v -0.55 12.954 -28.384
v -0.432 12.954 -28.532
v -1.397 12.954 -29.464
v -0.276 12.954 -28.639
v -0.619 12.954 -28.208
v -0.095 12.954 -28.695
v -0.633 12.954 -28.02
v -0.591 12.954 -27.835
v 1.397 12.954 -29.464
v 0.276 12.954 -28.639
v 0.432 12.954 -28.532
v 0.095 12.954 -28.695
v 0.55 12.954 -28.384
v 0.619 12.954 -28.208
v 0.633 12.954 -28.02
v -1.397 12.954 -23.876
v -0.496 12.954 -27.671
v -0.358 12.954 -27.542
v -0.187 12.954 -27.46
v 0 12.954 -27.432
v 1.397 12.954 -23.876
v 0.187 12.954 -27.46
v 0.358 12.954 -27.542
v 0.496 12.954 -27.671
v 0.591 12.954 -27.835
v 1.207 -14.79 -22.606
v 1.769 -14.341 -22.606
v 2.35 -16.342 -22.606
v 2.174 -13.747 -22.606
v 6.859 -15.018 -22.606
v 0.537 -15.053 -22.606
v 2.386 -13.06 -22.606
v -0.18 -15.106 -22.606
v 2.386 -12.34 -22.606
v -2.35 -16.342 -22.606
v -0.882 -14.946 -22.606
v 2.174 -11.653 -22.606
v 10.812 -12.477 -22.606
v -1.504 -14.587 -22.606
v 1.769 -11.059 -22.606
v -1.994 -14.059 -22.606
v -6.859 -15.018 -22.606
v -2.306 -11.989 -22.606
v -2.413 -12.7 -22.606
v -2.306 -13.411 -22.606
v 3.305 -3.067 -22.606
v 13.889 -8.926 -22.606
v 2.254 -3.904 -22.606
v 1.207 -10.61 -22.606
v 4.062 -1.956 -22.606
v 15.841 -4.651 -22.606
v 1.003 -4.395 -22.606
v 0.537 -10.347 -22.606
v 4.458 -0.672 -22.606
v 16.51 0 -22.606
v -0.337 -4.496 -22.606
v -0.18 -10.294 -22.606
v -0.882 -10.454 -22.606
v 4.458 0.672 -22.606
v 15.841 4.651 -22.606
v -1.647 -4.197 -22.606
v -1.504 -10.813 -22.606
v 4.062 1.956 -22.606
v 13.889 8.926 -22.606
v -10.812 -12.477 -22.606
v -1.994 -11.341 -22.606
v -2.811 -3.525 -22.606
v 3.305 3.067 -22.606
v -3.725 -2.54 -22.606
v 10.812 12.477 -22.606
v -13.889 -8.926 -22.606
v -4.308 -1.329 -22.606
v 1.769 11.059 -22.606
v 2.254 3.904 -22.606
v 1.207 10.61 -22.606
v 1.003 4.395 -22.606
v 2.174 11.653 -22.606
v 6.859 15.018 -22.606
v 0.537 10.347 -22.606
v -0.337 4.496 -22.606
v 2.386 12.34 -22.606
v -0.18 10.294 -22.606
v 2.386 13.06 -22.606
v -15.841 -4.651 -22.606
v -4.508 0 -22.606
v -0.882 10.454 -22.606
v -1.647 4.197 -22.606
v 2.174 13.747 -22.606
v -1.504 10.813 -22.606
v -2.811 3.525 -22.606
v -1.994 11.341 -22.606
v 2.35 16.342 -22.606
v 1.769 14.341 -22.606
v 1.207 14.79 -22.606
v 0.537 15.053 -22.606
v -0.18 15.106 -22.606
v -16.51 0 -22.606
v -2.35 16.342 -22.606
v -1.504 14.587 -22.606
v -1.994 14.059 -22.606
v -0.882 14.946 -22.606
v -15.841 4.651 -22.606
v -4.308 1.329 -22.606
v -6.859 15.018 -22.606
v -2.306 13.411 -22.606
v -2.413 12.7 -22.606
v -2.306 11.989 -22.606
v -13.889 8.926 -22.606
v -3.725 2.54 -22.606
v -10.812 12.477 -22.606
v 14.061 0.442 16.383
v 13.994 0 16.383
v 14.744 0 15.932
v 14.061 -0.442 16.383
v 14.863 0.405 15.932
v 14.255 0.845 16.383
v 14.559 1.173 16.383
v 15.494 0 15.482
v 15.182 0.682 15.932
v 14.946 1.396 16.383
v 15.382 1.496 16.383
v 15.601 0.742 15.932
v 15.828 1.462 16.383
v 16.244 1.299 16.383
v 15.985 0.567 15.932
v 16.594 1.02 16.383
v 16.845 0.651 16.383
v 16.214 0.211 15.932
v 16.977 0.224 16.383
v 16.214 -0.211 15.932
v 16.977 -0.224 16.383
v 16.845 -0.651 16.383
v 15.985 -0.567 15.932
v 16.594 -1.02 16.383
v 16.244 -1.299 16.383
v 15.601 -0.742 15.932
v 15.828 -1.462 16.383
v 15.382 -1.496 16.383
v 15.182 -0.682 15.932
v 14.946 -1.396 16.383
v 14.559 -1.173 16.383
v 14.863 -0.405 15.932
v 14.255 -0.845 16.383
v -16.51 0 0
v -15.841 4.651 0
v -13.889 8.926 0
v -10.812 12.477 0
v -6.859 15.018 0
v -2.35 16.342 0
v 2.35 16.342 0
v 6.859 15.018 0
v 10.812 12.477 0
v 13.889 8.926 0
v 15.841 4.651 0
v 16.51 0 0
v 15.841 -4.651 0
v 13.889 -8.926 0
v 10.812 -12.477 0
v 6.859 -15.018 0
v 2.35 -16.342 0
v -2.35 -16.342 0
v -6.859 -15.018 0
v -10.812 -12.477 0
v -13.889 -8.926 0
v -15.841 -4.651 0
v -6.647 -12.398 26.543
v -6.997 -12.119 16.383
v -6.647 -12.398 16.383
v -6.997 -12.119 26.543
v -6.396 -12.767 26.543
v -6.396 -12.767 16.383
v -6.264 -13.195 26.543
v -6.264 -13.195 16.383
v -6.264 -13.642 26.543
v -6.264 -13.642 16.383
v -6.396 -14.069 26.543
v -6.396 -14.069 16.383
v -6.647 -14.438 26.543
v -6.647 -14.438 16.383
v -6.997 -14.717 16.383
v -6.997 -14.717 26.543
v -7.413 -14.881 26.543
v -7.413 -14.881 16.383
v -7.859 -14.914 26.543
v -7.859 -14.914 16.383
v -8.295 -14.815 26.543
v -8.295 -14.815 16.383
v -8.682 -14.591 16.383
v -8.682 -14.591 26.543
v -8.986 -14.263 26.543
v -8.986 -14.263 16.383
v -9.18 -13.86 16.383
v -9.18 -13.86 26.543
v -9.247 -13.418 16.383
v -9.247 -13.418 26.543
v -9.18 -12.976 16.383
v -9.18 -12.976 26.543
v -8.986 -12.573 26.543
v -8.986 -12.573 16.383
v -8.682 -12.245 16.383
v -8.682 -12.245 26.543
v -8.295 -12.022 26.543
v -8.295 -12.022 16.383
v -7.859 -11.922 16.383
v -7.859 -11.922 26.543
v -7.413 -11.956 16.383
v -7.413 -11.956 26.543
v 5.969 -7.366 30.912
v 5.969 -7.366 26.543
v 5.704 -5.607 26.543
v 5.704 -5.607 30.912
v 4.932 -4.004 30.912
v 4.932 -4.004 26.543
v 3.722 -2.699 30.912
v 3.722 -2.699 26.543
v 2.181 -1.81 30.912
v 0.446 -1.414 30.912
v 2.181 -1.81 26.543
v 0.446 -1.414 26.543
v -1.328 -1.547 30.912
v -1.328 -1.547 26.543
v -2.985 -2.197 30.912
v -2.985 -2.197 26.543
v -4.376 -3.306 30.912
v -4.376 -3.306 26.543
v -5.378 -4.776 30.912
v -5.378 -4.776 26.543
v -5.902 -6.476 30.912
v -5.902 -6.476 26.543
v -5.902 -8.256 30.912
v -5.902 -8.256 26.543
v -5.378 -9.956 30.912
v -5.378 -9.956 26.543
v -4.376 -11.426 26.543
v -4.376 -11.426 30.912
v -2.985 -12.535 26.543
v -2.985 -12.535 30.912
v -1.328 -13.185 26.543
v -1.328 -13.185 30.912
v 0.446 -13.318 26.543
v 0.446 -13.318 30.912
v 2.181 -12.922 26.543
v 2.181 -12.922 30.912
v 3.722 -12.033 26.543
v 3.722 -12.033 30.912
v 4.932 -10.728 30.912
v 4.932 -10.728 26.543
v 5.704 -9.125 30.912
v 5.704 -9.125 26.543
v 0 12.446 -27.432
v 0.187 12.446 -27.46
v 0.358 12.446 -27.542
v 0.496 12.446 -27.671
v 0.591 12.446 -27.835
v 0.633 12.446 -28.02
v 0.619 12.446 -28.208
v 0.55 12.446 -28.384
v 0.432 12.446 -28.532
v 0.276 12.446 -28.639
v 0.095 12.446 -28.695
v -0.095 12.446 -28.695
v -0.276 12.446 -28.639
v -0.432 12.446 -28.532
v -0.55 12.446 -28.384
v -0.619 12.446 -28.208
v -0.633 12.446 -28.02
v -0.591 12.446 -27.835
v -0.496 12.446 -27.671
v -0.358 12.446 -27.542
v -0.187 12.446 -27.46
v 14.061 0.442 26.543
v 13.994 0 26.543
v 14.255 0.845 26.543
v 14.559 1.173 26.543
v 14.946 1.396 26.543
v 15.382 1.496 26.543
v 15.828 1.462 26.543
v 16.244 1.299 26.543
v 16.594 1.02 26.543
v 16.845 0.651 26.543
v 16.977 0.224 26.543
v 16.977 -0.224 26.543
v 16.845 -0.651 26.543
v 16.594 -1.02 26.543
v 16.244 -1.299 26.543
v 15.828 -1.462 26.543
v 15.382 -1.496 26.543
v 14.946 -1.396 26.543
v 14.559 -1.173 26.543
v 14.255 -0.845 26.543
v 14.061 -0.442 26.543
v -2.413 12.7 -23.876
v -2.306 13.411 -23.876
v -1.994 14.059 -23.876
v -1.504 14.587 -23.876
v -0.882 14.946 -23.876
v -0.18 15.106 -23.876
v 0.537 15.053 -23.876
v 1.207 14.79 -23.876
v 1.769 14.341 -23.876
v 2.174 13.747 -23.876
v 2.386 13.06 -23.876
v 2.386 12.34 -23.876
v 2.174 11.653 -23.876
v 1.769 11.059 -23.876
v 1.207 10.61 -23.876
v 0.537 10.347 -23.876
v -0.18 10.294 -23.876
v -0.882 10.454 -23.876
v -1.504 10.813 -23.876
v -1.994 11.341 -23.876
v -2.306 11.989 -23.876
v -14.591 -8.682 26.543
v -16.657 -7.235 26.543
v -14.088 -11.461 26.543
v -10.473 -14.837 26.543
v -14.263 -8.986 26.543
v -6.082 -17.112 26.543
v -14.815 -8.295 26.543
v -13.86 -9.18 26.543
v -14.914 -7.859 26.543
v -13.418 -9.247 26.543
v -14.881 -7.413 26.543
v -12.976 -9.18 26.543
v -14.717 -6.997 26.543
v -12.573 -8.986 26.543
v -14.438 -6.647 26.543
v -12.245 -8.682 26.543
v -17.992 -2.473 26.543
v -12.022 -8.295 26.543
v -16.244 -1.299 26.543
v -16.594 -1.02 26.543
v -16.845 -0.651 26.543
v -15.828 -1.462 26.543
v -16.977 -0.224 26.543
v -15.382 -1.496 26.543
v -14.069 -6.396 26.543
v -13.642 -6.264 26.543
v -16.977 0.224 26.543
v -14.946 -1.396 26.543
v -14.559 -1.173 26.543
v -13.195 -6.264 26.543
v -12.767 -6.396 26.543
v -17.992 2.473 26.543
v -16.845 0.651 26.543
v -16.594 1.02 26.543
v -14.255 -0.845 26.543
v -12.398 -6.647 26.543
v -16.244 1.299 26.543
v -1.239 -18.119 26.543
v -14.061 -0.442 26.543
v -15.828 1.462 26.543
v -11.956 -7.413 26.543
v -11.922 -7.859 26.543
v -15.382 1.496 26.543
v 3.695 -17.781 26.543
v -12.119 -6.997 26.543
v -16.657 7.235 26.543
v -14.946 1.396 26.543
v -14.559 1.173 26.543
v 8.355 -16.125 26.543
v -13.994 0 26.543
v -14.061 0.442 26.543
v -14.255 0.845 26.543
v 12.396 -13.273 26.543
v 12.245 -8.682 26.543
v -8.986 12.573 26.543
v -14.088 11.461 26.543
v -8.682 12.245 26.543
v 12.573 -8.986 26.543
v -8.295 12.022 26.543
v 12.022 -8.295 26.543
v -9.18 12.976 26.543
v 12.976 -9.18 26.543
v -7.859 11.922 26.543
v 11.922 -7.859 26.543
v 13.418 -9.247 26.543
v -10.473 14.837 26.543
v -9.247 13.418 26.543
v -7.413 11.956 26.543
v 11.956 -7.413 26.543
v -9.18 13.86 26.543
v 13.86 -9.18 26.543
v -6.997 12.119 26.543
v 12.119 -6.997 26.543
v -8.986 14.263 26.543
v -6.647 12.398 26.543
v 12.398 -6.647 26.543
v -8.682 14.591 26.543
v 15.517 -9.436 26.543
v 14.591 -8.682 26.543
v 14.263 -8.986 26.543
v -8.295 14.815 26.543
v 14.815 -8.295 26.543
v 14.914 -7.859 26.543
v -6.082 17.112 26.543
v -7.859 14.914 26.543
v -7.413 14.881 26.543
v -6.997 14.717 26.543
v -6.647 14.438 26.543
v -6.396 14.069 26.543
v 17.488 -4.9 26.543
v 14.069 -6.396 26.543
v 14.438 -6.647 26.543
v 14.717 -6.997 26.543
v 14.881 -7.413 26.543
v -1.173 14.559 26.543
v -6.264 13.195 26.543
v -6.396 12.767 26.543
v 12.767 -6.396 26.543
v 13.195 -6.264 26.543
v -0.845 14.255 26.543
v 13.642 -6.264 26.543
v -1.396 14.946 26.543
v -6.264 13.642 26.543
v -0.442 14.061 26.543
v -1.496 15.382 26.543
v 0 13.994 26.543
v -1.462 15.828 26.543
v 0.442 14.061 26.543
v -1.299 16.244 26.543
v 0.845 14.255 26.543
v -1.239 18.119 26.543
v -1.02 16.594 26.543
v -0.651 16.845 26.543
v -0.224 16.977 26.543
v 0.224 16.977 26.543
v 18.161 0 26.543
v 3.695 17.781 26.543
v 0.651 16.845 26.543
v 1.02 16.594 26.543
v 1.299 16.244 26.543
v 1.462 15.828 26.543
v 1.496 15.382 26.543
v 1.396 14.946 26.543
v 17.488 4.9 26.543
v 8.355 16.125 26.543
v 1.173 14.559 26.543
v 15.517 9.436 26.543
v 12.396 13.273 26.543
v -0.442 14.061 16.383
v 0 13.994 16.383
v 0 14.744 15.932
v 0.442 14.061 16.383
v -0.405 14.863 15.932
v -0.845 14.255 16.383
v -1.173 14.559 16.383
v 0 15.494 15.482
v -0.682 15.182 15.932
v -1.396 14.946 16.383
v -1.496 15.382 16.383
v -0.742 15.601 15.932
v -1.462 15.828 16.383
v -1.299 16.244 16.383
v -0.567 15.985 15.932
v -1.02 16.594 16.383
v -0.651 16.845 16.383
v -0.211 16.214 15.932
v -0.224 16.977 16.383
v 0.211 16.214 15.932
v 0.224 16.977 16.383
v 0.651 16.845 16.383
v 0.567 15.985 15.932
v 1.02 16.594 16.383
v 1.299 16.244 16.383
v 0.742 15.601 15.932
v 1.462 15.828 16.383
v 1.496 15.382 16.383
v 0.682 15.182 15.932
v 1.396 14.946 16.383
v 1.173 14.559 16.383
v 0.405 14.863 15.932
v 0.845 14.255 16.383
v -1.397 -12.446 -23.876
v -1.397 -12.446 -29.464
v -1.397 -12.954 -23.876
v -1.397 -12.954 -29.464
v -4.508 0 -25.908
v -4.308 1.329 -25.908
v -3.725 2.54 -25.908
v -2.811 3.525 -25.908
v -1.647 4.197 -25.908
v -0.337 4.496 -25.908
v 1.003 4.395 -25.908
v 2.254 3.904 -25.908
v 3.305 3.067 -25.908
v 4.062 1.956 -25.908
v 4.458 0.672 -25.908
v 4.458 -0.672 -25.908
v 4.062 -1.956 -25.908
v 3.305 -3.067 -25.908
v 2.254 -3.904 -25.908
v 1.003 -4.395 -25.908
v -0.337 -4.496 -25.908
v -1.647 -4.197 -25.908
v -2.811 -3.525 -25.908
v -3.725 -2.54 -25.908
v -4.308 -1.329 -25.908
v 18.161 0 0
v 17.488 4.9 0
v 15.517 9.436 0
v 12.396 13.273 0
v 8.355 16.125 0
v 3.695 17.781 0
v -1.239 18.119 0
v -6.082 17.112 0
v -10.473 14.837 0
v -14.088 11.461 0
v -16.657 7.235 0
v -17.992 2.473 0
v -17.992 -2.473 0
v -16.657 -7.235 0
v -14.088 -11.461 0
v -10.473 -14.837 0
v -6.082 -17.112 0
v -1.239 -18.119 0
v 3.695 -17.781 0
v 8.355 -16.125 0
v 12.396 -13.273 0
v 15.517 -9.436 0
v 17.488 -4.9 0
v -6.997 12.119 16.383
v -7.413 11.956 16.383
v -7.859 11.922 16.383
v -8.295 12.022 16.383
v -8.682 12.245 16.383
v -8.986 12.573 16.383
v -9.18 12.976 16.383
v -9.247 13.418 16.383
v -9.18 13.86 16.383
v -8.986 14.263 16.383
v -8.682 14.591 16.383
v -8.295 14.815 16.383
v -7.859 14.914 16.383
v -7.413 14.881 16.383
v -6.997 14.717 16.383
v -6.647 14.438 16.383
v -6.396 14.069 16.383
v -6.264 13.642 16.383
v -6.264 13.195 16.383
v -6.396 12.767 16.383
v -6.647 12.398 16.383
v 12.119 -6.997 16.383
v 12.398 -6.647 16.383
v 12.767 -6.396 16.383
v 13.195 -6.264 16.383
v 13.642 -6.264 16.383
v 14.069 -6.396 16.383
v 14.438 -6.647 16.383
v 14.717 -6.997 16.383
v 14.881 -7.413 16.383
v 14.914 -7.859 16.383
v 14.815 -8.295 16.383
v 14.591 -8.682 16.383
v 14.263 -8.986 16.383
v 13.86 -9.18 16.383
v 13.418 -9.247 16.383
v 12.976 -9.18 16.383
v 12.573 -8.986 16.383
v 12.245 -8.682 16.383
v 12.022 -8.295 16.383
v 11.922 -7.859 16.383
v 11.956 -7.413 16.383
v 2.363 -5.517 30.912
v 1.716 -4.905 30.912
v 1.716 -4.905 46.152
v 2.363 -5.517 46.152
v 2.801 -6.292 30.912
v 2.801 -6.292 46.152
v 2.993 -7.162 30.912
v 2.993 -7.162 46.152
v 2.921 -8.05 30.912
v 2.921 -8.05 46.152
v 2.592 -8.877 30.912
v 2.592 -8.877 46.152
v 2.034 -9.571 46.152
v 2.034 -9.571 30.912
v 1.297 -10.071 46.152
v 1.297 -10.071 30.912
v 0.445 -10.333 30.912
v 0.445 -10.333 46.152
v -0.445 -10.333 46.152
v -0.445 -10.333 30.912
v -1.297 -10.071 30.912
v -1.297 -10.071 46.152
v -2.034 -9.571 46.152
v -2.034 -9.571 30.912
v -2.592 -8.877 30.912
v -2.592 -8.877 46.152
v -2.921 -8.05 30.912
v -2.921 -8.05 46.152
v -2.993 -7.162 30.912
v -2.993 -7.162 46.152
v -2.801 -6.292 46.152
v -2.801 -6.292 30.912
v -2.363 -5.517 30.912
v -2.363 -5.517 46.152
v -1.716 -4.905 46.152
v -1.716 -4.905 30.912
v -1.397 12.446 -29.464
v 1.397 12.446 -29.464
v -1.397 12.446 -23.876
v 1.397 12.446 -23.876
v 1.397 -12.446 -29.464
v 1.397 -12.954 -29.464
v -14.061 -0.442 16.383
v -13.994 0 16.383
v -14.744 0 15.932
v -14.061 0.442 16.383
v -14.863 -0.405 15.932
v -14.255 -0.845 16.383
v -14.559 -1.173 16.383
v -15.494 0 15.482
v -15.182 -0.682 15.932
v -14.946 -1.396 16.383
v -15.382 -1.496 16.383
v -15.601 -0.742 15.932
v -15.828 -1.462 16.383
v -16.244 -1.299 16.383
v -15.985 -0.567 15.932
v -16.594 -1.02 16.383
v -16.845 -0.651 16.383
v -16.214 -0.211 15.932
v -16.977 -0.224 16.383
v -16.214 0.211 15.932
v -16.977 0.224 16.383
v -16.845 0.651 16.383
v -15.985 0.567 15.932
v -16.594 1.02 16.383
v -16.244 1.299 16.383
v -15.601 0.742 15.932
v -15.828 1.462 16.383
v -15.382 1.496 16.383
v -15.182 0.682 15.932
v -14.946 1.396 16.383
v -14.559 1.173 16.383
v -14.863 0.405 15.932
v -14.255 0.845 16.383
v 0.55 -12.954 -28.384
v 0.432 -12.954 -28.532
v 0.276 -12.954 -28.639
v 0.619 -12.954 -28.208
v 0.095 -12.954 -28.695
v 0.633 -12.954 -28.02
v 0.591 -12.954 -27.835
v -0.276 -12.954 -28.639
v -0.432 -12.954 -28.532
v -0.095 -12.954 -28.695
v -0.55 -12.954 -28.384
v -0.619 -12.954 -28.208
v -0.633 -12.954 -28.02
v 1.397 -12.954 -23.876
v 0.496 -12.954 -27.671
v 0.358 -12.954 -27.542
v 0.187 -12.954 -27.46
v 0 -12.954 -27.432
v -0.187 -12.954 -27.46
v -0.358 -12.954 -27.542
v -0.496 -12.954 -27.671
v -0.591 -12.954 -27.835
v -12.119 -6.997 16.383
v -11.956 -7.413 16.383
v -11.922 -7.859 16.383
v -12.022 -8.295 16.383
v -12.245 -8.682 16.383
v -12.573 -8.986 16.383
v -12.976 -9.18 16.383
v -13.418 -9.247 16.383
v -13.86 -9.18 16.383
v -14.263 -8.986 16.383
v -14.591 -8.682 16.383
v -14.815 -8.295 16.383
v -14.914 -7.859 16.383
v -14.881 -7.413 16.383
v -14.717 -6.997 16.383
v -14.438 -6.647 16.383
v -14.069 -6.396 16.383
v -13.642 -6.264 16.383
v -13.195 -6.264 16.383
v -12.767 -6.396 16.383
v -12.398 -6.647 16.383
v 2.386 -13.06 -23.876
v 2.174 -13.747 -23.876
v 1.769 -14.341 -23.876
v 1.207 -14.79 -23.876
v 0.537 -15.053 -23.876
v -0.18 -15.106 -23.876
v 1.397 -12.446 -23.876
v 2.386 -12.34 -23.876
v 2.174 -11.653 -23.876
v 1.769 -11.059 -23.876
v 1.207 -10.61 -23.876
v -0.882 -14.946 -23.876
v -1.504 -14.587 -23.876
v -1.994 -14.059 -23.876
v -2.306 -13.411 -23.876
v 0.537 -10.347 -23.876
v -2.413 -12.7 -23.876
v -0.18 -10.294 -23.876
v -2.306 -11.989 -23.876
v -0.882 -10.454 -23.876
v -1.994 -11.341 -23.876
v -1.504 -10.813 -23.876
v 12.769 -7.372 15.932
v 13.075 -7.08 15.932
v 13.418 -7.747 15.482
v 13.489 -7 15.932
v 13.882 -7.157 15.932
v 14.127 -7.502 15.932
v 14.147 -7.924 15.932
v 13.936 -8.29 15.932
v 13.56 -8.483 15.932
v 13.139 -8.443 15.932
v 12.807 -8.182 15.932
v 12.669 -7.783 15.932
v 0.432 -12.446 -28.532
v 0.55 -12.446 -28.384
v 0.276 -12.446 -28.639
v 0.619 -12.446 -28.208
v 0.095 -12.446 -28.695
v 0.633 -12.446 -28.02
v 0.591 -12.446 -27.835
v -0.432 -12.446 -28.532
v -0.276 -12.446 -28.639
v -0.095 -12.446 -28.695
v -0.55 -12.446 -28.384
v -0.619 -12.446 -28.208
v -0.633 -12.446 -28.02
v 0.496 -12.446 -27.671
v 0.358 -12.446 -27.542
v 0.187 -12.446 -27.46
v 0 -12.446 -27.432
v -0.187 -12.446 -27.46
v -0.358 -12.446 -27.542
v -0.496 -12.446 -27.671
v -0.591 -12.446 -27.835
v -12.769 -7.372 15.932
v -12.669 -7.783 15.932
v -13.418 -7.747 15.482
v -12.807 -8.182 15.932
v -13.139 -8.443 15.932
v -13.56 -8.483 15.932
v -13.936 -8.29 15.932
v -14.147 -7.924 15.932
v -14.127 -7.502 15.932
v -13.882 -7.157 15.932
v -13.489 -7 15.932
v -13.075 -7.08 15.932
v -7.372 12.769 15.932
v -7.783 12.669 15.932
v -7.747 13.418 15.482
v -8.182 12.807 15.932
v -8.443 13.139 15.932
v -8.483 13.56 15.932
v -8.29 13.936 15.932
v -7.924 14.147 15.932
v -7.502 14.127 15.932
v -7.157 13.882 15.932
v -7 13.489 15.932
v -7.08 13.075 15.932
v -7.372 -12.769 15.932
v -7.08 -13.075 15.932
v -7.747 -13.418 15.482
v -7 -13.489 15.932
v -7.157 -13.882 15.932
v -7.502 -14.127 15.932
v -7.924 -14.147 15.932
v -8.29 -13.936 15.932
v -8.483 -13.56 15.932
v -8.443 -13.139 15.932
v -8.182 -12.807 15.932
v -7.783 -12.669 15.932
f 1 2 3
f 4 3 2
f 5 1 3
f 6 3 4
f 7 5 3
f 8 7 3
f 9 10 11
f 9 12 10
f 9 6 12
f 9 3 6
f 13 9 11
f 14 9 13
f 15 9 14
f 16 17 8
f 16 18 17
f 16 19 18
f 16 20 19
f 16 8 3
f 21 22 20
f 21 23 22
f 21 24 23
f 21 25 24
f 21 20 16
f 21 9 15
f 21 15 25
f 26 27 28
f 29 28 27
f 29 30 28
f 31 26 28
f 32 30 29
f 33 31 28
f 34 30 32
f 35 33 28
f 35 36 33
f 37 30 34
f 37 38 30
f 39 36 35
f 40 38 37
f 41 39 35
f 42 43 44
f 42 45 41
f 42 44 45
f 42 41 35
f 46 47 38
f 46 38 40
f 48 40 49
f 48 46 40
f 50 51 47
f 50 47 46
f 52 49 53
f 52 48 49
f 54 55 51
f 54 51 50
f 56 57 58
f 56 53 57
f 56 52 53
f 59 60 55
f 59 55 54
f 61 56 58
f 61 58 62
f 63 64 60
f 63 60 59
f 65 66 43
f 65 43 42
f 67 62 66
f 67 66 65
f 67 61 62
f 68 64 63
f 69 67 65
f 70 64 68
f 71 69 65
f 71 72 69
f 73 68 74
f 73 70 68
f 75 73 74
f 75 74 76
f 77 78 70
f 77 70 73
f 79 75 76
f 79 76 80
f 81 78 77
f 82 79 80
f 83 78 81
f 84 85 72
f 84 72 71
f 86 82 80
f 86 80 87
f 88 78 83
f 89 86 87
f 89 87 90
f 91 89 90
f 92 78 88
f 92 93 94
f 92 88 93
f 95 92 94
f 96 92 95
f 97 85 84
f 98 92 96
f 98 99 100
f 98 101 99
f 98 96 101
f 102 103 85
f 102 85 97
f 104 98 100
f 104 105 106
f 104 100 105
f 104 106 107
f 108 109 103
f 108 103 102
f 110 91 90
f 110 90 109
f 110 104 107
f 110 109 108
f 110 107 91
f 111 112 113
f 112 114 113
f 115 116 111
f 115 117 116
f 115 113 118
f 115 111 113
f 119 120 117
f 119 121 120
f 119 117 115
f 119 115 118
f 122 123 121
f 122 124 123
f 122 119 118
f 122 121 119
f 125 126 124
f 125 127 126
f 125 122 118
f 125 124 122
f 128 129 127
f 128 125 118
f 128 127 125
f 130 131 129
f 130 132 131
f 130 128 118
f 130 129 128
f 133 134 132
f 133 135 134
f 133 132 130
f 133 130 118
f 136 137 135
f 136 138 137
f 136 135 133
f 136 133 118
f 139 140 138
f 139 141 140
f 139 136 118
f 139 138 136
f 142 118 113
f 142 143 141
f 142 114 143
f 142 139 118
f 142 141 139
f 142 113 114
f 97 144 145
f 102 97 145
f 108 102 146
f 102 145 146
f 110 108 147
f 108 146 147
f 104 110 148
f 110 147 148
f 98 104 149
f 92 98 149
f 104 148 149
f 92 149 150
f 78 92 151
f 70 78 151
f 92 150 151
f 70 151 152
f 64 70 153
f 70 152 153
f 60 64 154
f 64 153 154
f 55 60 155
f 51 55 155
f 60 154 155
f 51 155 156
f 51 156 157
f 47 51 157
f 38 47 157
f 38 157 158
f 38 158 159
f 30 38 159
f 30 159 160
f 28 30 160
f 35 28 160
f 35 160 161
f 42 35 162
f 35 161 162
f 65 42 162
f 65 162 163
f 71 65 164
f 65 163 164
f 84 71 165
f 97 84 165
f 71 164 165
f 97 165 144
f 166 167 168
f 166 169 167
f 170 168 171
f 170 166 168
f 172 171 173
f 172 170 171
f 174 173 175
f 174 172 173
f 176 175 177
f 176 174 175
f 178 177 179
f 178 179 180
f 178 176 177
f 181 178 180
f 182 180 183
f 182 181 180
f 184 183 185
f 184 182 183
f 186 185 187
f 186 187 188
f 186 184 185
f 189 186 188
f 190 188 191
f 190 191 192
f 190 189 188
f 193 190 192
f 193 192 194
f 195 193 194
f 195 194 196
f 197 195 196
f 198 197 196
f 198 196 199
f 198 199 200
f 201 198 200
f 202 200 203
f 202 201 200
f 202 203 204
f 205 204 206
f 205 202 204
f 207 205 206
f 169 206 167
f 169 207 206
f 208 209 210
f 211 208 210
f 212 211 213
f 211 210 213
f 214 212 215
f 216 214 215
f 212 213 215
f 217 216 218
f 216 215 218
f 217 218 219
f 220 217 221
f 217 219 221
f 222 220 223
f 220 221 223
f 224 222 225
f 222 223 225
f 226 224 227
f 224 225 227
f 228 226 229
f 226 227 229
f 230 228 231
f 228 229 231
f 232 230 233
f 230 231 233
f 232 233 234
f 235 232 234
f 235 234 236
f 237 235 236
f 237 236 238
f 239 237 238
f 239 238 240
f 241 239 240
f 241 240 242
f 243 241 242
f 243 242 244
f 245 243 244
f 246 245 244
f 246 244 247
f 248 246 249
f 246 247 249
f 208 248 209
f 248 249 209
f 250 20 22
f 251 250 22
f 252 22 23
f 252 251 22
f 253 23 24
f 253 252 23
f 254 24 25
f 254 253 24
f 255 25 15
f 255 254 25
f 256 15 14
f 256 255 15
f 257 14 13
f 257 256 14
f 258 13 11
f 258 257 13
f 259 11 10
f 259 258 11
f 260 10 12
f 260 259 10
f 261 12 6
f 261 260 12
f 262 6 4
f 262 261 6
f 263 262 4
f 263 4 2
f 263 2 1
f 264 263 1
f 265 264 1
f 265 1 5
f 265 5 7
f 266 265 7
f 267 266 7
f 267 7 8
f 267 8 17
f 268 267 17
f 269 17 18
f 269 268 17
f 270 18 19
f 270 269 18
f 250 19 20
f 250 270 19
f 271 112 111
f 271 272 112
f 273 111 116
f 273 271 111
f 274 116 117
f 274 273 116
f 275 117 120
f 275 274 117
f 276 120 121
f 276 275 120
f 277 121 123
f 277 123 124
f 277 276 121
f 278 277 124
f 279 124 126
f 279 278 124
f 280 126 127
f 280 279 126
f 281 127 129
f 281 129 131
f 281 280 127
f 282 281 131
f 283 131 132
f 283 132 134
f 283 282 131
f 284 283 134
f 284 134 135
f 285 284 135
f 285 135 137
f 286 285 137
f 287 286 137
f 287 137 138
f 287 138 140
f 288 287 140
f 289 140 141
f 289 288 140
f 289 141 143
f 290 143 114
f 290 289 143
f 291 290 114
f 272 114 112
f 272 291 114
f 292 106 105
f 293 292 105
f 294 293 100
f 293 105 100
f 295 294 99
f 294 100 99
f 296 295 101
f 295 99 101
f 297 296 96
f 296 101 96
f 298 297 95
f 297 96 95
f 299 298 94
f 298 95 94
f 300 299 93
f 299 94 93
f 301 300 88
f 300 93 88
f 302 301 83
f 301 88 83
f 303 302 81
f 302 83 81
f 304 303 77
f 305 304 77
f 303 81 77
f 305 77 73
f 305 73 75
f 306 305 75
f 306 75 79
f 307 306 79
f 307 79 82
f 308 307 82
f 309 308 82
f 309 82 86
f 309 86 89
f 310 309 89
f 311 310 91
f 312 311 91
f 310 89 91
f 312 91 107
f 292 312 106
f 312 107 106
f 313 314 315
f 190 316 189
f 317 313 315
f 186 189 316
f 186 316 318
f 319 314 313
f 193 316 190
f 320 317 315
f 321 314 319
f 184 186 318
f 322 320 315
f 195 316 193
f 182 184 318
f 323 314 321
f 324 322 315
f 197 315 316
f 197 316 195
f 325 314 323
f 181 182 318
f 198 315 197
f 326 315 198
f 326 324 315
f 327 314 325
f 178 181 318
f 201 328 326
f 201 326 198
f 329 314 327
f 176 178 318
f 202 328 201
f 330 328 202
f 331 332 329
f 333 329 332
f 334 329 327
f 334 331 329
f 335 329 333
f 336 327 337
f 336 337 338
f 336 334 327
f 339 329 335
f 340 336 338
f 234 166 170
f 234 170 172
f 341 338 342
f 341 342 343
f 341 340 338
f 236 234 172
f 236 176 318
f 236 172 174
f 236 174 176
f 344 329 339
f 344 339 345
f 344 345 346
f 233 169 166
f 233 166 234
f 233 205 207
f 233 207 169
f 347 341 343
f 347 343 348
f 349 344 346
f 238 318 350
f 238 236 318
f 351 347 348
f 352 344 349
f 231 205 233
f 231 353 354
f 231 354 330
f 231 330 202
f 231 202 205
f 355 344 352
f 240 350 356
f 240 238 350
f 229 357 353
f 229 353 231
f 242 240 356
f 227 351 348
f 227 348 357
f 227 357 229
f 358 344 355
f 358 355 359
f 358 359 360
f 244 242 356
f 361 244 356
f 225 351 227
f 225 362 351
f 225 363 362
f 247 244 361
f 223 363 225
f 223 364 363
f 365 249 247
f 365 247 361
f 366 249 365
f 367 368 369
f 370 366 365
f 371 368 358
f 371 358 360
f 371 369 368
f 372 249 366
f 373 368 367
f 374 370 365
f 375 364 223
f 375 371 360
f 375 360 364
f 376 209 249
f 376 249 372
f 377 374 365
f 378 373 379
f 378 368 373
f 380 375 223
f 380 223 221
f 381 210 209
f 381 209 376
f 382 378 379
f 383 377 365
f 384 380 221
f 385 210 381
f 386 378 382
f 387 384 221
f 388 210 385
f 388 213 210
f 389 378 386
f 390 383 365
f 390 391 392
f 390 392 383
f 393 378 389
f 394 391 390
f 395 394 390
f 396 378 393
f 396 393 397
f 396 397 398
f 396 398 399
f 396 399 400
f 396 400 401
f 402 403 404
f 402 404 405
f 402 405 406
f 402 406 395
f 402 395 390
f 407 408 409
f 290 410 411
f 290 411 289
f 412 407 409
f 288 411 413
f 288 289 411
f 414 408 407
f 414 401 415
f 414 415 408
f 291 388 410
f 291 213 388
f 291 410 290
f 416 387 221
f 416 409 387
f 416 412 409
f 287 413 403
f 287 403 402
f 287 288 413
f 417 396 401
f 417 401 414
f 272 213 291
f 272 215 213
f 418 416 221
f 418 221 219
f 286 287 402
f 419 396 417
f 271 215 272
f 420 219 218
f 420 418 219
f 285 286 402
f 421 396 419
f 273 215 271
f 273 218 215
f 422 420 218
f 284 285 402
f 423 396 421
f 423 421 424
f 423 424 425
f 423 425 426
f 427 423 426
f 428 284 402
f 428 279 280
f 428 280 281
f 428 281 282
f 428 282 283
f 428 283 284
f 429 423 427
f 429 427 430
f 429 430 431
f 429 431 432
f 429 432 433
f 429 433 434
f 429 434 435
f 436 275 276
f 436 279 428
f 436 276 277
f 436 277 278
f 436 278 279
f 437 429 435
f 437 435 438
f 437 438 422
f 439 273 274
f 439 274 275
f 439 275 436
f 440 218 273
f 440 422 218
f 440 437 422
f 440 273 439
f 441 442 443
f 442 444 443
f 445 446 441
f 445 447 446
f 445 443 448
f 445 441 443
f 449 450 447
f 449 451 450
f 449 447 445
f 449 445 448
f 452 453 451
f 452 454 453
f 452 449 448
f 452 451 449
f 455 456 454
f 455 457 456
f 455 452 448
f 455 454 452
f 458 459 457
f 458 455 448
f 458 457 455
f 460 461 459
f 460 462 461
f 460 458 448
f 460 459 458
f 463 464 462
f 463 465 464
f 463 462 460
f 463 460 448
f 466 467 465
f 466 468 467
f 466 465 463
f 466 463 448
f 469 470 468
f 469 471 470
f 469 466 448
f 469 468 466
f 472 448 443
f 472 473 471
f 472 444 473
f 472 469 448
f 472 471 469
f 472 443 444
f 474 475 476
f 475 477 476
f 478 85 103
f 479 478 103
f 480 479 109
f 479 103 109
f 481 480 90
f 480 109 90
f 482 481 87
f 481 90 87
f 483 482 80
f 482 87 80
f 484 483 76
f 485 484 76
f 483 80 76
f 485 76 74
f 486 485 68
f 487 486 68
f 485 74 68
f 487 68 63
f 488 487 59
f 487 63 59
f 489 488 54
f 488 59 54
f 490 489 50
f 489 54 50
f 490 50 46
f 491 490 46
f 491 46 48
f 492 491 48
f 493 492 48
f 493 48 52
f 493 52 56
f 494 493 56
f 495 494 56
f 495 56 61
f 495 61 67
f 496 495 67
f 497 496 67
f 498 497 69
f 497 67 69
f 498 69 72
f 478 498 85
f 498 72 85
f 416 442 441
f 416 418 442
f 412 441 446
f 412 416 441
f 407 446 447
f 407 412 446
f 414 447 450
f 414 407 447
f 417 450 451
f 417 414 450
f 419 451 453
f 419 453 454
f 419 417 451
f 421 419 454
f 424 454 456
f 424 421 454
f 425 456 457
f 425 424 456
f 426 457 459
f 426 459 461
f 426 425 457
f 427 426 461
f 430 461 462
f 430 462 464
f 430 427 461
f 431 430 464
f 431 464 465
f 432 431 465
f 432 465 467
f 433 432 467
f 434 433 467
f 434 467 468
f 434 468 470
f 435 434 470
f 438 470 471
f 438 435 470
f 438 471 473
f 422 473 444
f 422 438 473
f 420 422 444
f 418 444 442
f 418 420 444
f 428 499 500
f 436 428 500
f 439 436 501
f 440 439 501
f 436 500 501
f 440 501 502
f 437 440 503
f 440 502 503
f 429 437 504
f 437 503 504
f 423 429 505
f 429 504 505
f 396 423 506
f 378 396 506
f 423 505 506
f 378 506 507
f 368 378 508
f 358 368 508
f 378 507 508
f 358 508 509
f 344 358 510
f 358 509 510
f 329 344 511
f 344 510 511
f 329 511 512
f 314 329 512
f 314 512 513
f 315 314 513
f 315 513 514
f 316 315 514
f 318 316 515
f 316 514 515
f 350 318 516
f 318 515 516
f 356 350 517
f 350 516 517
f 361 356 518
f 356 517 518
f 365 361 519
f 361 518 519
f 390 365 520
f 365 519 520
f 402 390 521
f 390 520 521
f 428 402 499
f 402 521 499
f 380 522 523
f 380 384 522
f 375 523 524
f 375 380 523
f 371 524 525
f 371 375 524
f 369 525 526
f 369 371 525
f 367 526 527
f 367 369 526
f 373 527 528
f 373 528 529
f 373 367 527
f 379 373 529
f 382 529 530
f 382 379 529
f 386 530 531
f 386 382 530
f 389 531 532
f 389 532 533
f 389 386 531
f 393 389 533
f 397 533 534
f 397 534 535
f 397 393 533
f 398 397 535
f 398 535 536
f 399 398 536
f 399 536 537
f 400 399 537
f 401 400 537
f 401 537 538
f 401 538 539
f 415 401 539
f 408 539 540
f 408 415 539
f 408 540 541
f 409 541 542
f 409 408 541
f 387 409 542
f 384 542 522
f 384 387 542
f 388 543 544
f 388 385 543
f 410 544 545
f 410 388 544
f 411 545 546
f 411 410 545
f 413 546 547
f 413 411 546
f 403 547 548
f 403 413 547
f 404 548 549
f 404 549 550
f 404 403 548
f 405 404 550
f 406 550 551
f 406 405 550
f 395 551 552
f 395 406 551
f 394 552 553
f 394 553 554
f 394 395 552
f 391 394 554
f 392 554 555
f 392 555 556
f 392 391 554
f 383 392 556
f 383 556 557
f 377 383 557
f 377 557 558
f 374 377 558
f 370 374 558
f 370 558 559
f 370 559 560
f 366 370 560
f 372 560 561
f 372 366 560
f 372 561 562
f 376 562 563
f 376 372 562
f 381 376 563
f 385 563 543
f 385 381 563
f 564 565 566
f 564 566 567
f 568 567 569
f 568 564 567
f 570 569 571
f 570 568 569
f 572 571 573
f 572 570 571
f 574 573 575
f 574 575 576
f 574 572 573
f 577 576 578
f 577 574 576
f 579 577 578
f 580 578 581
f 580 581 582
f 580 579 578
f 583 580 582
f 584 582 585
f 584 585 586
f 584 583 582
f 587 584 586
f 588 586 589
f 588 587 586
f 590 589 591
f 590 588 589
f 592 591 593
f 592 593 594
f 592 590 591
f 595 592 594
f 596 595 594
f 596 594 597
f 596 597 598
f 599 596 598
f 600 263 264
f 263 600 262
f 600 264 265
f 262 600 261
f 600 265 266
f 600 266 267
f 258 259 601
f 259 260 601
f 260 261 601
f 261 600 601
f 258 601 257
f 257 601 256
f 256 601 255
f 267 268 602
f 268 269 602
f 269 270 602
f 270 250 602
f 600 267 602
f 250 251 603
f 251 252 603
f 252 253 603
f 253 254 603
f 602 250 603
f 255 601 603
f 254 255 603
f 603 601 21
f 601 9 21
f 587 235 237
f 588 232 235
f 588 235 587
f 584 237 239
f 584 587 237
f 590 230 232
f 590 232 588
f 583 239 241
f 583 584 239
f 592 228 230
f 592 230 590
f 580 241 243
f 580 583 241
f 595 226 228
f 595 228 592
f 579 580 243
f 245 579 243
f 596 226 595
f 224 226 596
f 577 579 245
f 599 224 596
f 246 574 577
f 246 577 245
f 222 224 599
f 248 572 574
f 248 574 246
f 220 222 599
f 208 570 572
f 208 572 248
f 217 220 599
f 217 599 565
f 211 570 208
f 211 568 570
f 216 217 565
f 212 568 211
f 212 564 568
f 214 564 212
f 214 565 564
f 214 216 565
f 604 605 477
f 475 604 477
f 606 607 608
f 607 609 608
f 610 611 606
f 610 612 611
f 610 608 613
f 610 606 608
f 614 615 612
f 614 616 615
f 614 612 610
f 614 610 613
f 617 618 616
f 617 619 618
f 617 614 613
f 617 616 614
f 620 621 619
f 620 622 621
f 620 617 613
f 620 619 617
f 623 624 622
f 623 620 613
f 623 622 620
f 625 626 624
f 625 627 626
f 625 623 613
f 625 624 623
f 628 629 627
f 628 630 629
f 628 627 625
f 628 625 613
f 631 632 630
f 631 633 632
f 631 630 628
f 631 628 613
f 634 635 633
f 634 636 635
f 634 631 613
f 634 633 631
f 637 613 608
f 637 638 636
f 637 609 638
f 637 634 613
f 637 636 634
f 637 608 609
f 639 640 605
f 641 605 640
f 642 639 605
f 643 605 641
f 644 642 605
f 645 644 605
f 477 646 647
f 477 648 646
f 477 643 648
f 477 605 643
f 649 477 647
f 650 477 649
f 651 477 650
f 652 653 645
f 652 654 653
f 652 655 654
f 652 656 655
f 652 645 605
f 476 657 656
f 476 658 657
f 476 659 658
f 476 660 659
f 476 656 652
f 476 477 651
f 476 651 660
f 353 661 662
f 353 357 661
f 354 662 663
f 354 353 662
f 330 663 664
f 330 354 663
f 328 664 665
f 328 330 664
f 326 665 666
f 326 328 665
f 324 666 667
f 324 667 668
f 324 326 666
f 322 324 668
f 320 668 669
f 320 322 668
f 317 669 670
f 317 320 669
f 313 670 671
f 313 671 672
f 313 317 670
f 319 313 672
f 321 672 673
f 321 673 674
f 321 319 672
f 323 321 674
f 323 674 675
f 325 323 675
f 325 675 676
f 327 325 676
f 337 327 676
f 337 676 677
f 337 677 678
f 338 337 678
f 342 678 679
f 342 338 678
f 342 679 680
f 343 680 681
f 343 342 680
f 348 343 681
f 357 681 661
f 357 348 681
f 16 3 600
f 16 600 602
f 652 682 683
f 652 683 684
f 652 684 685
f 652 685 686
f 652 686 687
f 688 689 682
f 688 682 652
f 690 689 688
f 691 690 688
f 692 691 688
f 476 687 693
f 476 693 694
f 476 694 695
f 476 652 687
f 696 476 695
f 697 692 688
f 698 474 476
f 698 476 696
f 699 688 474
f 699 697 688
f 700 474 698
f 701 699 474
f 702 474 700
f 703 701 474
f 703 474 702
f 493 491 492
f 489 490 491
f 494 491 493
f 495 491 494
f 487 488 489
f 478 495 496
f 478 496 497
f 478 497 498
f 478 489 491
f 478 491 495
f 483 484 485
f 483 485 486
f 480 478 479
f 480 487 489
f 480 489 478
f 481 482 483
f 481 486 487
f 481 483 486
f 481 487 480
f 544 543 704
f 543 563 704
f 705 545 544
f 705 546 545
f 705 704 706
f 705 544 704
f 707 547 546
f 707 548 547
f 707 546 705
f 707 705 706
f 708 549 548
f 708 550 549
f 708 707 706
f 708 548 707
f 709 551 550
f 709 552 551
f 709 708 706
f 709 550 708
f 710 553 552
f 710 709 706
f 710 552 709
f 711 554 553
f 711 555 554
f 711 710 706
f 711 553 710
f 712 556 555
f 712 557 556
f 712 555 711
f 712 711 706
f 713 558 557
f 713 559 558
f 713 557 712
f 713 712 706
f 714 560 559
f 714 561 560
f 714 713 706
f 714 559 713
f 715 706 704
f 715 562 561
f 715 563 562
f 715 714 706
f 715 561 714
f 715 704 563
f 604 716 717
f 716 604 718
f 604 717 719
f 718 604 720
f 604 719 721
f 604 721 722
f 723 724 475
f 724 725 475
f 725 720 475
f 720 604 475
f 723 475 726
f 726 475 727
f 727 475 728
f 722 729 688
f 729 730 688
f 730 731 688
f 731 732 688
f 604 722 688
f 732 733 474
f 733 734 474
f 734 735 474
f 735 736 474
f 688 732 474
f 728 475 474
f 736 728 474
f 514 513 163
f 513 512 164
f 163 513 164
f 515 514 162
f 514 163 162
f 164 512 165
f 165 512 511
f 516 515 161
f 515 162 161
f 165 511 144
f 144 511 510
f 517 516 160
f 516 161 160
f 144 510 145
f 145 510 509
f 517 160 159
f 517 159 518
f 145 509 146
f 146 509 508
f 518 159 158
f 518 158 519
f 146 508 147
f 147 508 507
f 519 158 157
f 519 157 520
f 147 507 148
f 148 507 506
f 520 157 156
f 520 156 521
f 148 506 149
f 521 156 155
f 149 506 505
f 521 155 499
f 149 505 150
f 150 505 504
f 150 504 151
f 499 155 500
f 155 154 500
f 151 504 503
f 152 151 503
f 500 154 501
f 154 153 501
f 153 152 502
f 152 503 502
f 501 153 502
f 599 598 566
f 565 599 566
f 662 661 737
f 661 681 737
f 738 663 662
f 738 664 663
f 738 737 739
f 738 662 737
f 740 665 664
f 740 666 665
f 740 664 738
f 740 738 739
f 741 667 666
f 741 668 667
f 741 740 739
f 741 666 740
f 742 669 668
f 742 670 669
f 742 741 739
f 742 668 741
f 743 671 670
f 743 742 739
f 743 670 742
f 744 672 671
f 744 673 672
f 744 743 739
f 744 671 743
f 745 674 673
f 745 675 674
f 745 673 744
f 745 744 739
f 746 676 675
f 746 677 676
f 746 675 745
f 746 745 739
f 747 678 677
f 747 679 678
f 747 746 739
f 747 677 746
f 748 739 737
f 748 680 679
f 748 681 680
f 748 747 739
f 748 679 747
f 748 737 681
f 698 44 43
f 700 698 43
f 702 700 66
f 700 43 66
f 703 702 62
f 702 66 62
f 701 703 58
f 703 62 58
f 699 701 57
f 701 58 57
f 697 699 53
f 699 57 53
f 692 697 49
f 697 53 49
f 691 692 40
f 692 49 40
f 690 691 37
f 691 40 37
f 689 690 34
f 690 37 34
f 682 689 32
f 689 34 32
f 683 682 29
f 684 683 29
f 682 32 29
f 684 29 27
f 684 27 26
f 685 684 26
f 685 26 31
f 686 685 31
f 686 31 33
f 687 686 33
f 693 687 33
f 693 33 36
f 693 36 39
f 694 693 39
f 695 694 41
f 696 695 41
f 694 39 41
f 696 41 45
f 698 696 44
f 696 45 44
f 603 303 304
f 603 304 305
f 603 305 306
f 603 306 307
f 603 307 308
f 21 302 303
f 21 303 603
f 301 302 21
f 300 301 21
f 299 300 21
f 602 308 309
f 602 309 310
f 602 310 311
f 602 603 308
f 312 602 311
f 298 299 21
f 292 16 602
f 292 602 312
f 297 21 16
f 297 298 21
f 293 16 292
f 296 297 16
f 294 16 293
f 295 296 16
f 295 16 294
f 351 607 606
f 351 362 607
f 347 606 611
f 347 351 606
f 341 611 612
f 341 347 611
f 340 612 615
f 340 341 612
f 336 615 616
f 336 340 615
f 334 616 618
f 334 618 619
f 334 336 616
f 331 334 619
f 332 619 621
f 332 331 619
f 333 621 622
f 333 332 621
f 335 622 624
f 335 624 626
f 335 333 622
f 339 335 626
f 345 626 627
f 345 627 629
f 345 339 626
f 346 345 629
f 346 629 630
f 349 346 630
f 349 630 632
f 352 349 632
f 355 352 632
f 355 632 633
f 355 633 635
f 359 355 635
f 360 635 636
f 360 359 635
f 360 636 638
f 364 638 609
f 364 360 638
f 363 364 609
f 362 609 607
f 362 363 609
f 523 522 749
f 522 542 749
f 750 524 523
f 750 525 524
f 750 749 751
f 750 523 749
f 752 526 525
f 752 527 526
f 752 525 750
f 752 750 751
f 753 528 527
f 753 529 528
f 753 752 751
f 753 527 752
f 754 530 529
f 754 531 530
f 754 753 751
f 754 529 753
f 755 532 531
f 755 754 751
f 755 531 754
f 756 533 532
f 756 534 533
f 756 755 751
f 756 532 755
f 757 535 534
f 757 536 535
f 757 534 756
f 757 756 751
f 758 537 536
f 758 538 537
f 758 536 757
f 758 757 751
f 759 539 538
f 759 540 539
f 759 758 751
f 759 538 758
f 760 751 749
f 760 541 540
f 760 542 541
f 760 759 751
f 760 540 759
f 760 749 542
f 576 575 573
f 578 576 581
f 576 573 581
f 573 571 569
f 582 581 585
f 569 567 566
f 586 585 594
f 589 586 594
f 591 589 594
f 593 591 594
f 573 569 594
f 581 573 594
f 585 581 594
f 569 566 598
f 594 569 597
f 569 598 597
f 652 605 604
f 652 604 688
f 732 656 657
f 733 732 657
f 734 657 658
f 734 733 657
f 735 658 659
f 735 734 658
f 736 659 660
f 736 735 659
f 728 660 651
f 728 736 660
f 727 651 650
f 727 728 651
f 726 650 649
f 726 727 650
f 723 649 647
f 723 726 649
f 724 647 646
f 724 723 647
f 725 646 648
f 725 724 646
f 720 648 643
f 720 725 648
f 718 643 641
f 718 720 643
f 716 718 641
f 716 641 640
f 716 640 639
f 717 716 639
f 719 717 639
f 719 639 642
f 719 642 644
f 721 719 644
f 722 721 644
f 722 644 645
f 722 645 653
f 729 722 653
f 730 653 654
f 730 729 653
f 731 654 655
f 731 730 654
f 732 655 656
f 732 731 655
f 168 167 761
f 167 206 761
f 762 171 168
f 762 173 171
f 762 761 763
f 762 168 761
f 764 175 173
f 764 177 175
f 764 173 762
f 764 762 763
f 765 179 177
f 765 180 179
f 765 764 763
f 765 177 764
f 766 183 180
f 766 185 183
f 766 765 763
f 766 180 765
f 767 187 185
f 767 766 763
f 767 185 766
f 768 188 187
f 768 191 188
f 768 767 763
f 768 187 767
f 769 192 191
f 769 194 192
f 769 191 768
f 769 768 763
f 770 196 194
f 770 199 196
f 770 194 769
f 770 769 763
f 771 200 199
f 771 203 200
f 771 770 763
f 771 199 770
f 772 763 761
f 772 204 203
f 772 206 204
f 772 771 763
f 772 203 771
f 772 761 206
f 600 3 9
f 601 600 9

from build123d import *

# Parameters (mm, degrees)
SKETCH1_R           = 18.161
BOSS_EXTRUDE1_DEPTH = 26.543
SKETCH2_R           = 16.51
BOSS_EXTRUDE2_DEPTH = 22.606
SKETCH3_R           = 4.5085
BOSS_EXTRUDE3_DEPTH = 3.302
SKETCH4_R           = 2.413
BOSS_EXTRUDE4_DEPTH = 1.27
SKETCH5_R           = 5.969
BOSS_EXTRUDE5_DEPTH = 4.3688
BOSS_EXTRUDE6_DEPTH = 15.24
SKETCH8_W           = 5.588
SKETCH8_H           = 2.794
SKETCH8_R           = 0.635
BOSS_EXTRUDE7_DEPTH = 0.254
CIRPATTERN1_COUNT   = 2
CIRPATTERN2_COUNT   = 12


with BuildPart() as part:
    # Sketch1 → Boss-Extrude1 (new body)
    with BuildSketch(Plane.XY):
        Circle(SKETCH1_R)
    extrude(amount=BOSS_EXTRUDE1_DEPTH)

    # Sketch2 → Boss-Extrude2 (add)
    with BuildSketch(Plane(origin=(0, 0, 0), x_dir=(-1, 0, 0), z_dir=(0, 0, -1))):
        Circle(SKETCH2_R)
    extrude(amount=BOSS_EXTRUDE2_DEPTH)

    # Sketch3 → Boss-Extrude3 (add)
    with BuildSketch(Plane(origin=(0, 0, -22.606), x_dir=(-1, 0, 0), z_dir=(0, 0, -1))):
        Circle(SKETCH3_R)
    extrude(amount=BOSS_EXTRUDE3_DEPTH)

    # Sketch4 → Boss-Extrude4 (add)
    with BuildSketch(Plane(origin=(0, 0, -22.606), x_dir=(-1, 0, 0), z_dir=(0, 0, -1))):
        with Locations((0, -12.7)):
            Circle(SKETCH4_R)
        with Locations((0, 12.7)):
            Circle(SKETCH4_R)
    extrude(amount=BOSS_EXTRUDE4_DEPTH)

    # Sketch5 → Boss-Extrude5 (add)
    with BuildSketch(Plane.XY.offset(26.543)):
        with Locations((0, -7.366)):
            Circle(SKETCH5_R)
    extrude(amount=BOSS_EXTRUDE5_DEPTH)

    # Sketch6 → Boss-Extrude6 (add)
    with BuildSketch(Plane.XY.offset(30.9118)):
        with BuildLine():
            Line((-1.715657017, -4.905), (1.715657017, -4.905))
            ThreePointArc((1.715657017, -4.905), (0, -10.366), (-1.715657017, -4.905))
        make_face()
    extrude(amount=BOSS_EXTRUDE6_DEPTH)

    # Sketch8 → Boss-Extrude7 (add, symmetric)
    with BuildSketch(Plane.ZX.offset(12.7)):
        with Locations((-26.67, 0)):
            Rectangle(SKETCH8_W, SKETCH8_H)
        with Locations((-28.067, 0)):
            Circle(SKETCH8_R, mode=Mode.SUBTRACT)
    boss_extrude7 = extrude(amount=BOSS_EXTRUDE7_DEPTH, both=True)

    # CirPattern1: Boss-Extrude7 ×2 about axis
    cirpattern1_axis = Axis((0, 0, -25.908), (0, 0, 1))
    for i in range(1, CIRPATTERN1_COUNT):
        add(boss_extrude7.rotate(cirpattern1_axis, i * 360 / CIRPATTERN1_COUNT))

    # Sketch12 → Ø3.0mm Dowel Hole1 (revolve, cut)
    with BuildSketch(Plane(origin=(0, 15.494, 26.543), x_dir=(0, -1, 0), z_dir=(1, 0, 0))):
        Polygon((0, 0), (0, 11.061290929), (1.5, 10.16), (1.5, 0), align=None)
    f_3_0mm_dowel_hole1 = revolve(axis=Axis((0, 15.494, 32.893), (0, 0, -1)), mode=Mode.SUBTRACT)

    # CirPattern2: Ø3.0mm Dowel Hole1 ×12 about axis, 5 skipped
    cirpattern2_axis = Axis((0, 0, 26.543), (0, 0, -1))
    add([f_3_0mm_dowel_hole1.rotate(cirpattern2_axis, i * 360 / CIRPATTERN2_COUNT) for i in range(1, CIRPATTERN2_COUNT) if i not in (1, 2, 5, 6, 10)], mode=Mode.SUBTRACT)


solid = part.part
